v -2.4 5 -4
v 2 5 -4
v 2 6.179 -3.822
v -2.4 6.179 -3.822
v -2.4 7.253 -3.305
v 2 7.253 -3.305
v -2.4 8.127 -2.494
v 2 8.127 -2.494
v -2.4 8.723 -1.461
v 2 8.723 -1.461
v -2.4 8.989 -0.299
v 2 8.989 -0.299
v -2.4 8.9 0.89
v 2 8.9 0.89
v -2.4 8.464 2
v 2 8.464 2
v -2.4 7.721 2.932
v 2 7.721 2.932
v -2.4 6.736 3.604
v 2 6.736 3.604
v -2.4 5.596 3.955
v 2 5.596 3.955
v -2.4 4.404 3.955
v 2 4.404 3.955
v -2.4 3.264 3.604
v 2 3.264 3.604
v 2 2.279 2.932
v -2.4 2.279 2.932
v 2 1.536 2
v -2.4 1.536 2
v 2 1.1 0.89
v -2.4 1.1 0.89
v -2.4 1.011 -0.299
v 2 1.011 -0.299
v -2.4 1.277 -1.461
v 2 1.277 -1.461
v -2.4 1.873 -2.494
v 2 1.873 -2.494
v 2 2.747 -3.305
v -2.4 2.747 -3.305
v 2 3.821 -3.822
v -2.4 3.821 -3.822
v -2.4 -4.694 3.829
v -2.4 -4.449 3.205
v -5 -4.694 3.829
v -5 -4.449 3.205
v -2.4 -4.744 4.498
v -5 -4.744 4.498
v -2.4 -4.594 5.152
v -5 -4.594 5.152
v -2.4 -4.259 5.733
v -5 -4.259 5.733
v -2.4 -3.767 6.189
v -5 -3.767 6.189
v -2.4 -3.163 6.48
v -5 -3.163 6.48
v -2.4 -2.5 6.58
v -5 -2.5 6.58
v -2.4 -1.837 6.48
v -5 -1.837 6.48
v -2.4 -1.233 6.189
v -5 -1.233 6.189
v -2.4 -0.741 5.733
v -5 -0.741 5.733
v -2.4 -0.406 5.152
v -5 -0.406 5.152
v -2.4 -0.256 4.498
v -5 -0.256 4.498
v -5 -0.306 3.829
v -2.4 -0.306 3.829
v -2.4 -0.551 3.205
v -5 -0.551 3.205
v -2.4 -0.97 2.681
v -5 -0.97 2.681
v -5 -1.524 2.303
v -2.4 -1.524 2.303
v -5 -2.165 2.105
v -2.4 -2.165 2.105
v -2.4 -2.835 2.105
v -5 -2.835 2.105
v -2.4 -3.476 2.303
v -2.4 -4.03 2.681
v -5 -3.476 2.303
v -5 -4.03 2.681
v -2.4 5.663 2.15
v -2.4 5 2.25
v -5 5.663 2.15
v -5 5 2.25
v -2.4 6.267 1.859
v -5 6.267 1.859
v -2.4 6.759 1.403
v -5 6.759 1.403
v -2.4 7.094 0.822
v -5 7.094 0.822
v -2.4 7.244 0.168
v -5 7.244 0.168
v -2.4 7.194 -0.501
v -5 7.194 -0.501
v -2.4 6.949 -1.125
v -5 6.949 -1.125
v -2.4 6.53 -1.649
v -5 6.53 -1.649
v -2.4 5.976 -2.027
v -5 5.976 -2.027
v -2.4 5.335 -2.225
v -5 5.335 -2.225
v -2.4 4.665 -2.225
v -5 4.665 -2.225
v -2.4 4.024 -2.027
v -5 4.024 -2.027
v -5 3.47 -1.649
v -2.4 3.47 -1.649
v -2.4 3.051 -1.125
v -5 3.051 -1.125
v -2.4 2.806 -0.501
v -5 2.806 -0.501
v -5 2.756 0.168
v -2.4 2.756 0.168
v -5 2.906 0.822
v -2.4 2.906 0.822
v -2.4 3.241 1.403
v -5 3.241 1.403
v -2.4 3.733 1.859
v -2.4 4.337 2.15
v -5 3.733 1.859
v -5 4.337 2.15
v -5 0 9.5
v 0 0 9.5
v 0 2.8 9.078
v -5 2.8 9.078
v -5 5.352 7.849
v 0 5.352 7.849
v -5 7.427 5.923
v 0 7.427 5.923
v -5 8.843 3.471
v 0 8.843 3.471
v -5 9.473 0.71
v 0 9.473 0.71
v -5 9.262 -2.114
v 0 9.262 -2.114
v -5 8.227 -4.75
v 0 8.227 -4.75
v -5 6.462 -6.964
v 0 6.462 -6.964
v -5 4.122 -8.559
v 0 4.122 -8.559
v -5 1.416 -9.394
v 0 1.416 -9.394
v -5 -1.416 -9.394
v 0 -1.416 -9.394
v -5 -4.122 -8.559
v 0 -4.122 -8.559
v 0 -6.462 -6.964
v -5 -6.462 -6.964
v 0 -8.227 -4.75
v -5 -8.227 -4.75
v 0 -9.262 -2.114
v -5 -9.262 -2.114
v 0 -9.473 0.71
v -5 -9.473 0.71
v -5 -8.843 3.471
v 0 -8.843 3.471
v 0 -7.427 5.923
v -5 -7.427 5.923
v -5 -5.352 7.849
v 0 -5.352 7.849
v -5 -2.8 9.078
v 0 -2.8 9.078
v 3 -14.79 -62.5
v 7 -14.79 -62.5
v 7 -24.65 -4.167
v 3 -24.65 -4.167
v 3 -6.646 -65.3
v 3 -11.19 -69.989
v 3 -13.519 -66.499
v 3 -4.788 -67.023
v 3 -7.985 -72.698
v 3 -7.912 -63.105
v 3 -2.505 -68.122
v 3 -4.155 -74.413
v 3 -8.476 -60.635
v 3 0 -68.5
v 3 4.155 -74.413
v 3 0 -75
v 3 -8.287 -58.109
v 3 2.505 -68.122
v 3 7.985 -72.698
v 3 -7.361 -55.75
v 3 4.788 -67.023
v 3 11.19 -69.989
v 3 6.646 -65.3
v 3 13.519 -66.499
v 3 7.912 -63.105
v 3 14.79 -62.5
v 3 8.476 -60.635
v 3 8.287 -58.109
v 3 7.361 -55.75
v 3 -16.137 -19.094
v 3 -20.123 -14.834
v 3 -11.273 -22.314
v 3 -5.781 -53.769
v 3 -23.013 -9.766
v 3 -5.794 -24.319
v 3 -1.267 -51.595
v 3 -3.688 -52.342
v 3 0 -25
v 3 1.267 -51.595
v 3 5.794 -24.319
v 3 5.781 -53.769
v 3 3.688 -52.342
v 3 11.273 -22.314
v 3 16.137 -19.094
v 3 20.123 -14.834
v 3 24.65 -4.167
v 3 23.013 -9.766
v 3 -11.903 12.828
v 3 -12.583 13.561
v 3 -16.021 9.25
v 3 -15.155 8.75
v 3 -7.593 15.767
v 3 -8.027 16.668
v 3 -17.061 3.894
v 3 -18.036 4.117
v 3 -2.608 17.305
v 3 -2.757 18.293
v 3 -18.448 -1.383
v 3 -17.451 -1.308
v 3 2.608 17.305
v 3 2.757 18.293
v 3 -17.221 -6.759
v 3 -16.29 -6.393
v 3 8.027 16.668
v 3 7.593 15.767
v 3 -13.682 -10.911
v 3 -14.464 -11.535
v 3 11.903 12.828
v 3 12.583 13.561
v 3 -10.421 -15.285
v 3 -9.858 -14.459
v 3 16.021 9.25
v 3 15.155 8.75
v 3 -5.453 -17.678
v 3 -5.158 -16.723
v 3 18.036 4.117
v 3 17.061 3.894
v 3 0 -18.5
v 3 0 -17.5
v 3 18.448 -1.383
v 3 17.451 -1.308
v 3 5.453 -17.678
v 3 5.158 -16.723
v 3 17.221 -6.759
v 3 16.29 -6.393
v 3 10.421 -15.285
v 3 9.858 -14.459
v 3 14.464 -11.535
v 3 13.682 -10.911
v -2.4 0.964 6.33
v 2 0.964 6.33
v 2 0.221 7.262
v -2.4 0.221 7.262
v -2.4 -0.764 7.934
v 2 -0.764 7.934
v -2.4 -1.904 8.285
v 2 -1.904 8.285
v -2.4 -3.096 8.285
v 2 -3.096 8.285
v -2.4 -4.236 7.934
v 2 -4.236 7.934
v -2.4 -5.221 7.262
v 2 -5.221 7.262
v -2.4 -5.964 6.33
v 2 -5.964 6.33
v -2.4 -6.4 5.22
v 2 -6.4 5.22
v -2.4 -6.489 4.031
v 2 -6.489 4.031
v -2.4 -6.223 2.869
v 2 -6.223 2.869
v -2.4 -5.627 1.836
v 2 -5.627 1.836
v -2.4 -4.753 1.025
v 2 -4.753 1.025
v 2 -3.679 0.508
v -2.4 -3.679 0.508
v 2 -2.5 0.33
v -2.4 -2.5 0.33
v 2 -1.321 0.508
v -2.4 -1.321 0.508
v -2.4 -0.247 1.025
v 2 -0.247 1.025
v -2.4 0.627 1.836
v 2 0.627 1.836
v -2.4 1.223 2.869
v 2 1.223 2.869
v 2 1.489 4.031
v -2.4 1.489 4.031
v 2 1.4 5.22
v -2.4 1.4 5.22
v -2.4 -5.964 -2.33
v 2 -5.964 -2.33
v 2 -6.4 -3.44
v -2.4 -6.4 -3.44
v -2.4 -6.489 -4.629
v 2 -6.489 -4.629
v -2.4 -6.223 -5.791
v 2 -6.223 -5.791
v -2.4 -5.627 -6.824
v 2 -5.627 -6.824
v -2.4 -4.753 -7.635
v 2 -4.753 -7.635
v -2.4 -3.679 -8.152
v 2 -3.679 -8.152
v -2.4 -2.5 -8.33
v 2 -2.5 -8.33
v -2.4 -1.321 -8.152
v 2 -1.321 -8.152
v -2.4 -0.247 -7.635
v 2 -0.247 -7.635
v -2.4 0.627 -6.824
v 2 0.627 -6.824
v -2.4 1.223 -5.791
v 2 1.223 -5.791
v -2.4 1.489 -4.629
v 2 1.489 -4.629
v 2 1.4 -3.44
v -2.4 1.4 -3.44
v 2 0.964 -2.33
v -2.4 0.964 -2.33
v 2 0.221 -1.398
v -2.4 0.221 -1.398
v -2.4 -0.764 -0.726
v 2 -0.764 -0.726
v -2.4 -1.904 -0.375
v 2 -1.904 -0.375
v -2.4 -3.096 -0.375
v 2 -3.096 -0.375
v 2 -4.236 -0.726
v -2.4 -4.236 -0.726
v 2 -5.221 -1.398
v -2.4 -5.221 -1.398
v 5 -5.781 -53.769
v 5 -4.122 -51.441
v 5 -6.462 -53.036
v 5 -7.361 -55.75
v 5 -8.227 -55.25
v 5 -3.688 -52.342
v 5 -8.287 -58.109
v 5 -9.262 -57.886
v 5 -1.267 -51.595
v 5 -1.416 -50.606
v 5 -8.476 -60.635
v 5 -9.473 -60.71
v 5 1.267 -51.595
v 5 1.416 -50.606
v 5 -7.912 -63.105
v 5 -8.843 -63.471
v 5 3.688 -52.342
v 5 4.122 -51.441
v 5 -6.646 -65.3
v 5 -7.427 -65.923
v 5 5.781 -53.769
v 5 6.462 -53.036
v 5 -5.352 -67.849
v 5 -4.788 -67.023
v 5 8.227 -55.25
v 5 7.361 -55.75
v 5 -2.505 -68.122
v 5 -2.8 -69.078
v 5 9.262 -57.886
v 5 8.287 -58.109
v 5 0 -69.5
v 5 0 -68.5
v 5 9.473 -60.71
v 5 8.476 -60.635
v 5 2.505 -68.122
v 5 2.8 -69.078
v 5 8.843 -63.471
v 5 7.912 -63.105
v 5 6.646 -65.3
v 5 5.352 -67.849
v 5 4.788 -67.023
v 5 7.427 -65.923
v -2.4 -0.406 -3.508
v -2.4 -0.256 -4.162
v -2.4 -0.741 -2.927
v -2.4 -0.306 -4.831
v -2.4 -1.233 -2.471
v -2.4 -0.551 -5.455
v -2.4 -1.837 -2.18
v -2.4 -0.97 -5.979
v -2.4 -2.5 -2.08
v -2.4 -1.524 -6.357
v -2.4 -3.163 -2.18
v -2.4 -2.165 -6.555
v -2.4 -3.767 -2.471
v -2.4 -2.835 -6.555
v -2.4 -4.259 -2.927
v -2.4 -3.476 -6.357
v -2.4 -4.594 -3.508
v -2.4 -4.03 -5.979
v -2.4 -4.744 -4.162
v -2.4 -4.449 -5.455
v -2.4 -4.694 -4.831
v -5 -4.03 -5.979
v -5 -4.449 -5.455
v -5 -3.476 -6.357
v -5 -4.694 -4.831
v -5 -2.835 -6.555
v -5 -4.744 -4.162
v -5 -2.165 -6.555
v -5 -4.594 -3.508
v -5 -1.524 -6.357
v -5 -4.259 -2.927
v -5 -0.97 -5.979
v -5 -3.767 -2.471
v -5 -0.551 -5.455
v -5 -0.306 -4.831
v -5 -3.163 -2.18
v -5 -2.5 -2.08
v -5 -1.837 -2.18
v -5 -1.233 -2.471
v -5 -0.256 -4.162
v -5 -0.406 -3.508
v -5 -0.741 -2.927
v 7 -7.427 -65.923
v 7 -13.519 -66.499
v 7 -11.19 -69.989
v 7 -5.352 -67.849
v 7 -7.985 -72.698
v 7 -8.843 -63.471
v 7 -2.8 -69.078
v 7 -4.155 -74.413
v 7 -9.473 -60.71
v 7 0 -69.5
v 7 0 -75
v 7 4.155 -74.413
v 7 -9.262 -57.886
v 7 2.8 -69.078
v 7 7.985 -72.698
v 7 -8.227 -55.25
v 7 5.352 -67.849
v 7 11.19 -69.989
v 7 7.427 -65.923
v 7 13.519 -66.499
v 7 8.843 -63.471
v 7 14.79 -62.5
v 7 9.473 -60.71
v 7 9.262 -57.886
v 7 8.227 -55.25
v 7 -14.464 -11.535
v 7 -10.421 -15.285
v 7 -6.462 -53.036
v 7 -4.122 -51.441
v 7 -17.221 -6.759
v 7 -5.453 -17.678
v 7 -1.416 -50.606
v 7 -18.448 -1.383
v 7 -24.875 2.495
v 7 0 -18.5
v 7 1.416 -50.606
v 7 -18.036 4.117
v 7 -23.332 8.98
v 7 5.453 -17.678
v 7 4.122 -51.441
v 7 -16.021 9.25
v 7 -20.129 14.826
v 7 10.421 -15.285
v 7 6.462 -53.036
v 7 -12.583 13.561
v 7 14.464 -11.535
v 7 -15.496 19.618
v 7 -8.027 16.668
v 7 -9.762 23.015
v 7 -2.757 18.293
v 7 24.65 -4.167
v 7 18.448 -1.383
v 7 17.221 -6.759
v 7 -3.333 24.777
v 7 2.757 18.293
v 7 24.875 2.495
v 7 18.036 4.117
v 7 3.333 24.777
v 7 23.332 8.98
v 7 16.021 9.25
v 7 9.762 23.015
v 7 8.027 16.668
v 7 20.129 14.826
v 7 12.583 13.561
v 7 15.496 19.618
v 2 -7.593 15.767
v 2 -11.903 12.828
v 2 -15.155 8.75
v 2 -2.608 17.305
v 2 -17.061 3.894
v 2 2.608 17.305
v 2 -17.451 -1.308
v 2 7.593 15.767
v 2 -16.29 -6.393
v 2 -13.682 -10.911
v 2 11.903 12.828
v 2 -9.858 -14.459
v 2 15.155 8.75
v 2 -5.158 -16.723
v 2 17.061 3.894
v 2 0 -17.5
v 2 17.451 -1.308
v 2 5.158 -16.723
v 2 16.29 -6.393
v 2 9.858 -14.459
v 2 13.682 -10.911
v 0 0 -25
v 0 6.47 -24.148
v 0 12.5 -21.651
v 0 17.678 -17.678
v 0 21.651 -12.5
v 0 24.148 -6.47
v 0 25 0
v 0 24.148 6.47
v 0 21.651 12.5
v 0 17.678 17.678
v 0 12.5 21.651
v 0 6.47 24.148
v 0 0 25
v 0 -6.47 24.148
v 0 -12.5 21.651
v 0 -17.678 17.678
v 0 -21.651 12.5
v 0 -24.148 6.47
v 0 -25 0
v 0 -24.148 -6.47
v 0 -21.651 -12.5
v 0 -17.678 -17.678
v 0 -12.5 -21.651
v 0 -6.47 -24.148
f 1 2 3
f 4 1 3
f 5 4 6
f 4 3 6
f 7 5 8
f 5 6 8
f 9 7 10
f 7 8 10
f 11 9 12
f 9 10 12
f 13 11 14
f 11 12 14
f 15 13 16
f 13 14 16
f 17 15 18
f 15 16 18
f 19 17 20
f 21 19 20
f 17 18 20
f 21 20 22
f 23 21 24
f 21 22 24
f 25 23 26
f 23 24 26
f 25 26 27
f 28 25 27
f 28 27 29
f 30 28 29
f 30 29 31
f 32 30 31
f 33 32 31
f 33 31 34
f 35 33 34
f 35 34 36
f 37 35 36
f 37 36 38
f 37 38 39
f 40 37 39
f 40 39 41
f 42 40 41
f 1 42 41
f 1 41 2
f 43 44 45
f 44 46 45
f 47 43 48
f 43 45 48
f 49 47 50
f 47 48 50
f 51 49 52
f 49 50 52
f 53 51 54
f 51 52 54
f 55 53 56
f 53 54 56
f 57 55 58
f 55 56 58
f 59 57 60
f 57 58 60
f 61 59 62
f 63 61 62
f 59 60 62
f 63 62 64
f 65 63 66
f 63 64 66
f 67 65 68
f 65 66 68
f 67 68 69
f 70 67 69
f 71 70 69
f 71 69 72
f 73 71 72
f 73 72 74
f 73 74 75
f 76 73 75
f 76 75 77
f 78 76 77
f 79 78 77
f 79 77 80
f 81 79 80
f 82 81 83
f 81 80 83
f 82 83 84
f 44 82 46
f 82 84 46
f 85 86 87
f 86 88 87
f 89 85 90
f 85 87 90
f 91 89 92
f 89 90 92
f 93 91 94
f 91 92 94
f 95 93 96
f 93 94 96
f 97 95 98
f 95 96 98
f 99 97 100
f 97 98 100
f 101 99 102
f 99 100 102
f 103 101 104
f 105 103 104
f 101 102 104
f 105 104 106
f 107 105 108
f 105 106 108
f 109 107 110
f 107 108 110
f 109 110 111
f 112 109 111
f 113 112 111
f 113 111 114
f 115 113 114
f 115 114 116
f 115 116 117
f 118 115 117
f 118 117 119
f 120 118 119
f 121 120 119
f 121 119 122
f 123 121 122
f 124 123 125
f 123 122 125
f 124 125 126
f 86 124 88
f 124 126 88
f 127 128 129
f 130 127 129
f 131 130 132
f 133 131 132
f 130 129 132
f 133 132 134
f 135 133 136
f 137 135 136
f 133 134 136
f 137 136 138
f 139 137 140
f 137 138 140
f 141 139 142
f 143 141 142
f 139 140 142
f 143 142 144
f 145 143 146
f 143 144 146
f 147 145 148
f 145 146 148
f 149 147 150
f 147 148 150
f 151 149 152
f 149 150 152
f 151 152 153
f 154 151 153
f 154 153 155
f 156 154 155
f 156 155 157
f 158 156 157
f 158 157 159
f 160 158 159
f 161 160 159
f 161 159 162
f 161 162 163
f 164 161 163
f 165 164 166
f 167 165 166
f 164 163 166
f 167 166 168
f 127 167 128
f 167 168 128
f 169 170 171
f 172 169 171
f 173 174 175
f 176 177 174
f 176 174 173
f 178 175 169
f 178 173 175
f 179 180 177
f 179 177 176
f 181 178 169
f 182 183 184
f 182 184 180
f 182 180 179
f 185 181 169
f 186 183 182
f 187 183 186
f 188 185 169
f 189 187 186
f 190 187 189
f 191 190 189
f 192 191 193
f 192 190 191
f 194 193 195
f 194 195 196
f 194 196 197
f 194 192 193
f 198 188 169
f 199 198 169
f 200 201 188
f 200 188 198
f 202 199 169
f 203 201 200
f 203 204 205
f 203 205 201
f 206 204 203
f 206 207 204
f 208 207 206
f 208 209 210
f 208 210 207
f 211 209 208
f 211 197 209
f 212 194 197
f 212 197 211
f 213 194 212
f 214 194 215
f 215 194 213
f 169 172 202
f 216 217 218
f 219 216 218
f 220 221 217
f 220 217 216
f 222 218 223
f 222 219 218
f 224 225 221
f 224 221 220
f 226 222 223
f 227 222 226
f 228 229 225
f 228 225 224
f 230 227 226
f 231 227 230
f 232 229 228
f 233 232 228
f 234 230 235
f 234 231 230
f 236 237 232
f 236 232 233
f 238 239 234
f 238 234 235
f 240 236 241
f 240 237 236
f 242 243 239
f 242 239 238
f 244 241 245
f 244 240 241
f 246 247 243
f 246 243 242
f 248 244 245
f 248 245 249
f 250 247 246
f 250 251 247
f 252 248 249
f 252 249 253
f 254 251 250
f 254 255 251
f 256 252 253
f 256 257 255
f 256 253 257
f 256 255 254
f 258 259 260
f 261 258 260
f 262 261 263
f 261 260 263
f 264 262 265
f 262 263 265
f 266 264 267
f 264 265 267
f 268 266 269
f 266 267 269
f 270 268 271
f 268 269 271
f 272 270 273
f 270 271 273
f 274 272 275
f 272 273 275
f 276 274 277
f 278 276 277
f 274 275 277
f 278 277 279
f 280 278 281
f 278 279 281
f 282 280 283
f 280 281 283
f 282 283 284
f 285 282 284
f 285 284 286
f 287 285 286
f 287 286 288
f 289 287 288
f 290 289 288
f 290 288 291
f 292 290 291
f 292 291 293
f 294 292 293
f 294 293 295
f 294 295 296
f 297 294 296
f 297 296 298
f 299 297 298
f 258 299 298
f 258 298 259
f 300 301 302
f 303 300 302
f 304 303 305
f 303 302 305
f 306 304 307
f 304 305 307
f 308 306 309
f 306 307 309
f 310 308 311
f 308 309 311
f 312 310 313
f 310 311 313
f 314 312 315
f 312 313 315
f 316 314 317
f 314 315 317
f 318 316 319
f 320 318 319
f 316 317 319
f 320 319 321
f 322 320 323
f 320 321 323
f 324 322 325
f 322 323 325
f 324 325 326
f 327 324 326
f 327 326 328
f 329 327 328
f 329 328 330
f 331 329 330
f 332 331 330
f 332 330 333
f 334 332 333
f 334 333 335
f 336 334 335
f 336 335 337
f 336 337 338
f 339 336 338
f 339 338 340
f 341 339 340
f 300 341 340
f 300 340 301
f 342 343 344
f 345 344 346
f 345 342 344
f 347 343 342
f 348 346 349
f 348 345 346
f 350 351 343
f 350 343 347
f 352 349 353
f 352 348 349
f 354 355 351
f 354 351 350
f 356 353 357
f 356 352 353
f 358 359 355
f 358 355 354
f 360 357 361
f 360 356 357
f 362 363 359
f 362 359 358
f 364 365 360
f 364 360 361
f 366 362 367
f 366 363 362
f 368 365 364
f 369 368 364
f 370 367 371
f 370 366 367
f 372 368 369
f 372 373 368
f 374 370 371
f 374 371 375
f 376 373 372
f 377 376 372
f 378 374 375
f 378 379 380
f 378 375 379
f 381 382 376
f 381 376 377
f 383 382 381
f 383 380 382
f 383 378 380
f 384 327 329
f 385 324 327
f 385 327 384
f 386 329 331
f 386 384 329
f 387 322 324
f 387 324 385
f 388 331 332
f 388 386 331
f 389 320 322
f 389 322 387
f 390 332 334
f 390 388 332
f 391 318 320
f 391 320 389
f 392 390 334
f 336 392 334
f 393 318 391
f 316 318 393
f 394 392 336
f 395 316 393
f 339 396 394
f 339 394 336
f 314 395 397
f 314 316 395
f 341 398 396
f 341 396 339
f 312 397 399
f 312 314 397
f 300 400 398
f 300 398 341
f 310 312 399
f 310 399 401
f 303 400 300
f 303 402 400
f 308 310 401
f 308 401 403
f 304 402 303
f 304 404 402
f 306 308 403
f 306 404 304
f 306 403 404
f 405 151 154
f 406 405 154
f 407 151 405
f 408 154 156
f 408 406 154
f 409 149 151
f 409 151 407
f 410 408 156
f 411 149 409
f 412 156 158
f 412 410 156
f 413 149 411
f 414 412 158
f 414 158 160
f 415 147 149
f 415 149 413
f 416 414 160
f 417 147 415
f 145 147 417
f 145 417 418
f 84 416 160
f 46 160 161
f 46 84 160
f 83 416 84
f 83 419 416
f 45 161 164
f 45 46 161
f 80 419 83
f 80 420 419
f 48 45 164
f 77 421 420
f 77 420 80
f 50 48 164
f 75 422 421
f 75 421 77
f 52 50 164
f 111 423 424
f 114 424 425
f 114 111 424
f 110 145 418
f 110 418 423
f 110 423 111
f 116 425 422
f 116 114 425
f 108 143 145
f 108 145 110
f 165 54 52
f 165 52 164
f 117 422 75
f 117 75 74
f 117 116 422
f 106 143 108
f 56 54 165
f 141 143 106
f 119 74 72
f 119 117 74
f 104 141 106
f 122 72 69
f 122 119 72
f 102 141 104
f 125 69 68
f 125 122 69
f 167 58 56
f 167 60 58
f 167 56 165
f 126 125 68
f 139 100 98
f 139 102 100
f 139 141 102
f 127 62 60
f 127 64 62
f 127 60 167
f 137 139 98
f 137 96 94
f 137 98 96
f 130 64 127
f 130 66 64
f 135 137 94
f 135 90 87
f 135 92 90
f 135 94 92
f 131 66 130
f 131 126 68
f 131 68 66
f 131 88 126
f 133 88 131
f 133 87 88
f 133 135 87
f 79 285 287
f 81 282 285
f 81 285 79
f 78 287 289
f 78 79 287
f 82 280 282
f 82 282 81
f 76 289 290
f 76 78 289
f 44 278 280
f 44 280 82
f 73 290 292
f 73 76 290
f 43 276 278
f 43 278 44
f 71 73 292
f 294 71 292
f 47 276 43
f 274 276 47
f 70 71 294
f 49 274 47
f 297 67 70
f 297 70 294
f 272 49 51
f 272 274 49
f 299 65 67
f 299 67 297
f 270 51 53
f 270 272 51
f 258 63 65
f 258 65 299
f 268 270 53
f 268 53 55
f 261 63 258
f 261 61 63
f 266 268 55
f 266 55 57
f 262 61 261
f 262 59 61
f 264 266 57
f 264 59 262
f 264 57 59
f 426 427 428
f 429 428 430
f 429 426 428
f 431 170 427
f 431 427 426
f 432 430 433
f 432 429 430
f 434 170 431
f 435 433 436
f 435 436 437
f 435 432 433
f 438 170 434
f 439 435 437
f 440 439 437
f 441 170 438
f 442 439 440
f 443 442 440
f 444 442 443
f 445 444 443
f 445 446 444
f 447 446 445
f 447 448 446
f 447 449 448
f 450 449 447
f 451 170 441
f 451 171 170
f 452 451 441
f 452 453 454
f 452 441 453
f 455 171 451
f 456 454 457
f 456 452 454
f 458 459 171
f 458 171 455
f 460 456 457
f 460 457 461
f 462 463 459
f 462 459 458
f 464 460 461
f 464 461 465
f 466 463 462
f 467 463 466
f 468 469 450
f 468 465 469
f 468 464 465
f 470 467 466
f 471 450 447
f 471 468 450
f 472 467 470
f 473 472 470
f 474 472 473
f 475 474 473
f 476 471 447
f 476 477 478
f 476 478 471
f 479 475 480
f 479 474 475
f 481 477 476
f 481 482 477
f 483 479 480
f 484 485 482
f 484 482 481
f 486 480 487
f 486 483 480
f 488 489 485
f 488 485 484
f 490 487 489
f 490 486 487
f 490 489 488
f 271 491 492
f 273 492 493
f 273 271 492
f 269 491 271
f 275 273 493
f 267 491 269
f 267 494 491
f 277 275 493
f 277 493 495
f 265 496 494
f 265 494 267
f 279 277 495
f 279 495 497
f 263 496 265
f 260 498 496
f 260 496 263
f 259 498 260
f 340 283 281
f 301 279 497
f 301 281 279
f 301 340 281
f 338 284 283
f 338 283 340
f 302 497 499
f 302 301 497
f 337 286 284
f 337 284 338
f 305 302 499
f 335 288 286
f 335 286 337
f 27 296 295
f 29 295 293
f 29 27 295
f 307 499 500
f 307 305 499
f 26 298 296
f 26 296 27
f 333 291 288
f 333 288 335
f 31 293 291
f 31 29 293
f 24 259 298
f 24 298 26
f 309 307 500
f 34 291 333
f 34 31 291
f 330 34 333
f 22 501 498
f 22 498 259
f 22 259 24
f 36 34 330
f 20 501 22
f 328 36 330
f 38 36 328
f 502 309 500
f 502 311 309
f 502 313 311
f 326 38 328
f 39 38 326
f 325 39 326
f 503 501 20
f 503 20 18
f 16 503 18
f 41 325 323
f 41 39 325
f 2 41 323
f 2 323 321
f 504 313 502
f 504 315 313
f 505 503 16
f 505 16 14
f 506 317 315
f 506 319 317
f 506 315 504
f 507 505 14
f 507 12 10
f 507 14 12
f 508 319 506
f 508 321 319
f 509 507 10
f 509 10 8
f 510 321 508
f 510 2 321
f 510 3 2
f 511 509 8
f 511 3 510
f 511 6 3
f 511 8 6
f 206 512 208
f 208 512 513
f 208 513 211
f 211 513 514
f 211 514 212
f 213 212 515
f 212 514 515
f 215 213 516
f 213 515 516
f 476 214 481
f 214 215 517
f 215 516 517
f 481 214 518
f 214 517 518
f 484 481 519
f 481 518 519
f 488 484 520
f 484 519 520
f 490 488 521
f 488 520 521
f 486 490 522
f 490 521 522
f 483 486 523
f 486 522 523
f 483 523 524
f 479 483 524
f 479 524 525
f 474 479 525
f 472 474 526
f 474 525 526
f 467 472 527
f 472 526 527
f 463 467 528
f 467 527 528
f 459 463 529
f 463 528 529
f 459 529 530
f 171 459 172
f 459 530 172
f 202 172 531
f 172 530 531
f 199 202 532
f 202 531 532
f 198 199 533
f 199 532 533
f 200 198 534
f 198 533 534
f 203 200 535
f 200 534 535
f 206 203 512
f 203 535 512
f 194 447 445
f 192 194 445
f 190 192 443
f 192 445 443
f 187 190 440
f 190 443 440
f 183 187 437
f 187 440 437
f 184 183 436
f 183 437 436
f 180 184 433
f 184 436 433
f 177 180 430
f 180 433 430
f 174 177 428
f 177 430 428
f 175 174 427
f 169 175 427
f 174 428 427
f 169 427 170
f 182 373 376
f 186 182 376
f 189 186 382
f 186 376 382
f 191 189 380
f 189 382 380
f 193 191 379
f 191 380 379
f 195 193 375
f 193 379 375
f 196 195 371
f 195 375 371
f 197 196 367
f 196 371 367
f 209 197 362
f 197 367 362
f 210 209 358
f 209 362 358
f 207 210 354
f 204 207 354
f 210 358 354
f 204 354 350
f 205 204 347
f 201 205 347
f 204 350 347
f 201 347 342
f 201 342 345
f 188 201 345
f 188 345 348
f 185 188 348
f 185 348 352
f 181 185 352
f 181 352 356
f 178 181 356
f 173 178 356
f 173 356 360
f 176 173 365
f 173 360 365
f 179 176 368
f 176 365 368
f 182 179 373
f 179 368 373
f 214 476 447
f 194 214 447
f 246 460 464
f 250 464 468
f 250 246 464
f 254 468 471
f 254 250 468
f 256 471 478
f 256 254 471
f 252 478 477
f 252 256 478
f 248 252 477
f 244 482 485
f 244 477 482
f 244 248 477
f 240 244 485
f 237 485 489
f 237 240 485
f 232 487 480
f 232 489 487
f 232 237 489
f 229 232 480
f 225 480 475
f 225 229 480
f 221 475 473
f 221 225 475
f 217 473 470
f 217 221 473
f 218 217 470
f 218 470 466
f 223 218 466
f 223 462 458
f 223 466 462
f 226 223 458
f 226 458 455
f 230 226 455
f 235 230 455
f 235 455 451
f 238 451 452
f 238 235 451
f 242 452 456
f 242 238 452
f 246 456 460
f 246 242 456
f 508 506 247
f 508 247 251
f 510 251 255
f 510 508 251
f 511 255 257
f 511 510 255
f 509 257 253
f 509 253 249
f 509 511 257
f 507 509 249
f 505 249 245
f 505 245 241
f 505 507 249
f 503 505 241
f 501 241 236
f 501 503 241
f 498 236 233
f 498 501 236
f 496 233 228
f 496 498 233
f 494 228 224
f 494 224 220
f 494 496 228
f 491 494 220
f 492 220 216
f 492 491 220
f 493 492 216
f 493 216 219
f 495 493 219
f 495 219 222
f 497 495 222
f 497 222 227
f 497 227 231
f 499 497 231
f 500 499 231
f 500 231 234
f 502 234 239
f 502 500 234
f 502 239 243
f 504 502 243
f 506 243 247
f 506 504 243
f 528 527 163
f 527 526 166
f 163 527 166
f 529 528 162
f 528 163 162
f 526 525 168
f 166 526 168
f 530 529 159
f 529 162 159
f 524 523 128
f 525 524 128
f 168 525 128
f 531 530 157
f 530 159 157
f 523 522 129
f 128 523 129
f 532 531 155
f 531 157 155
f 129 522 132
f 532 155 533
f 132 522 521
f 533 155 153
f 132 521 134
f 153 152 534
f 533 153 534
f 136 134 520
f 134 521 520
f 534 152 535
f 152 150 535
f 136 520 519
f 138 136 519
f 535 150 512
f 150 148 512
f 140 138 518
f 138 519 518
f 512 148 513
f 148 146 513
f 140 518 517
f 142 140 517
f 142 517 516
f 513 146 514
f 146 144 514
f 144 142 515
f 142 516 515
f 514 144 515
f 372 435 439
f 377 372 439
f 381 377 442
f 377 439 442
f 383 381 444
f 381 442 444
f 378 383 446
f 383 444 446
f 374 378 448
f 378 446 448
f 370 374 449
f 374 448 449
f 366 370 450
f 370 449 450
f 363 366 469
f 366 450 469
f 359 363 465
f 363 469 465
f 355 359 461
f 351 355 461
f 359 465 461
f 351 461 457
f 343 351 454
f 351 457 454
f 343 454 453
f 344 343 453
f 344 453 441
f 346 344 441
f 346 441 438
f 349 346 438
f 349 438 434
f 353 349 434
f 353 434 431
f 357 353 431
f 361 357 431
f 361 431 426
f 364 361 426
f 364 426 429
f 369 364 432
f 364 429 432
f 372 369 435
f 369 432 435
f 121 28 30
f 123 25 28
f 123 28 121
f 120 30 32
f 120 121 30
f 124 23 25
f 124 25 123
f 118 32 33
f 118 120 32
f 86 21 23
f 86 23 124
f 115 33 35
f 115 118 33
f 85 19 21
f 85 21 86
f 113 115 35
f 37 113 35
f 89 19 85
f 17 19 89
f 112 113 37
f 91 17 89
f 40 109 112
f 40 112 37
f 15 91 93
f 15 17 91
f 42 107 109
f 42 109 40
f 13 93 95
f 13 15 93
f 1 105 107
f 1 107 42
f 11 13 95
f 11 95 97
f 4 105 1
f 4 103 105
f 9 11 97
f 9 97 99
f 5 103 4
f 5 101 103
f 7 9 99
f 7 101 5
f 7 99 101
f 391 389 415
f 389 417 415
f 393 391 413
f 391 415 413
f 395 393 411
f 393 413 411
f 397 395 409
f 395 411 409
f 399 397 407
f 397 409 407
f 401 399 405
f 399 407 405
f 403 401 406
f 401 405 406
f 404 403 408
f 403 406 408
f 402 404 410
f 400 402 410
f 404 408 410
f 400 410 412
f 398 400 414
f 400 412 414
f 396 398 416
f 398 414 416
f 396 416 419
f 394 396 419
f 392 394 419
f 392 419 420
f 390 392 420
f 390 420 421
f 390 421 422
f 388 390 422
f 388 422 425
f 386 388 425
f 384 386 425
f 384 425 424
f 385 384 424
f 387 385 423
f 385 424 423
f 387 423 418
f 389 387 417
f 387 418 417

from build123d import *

# Parameters (mm, degrees)
SKETCH_3_R                   = 25
EXTRUDE_1_DEPTH              = 2
SKETCH_4_R                   = 25
SKETCH_4_R_2                 = 17.5
EXTRUDE_2_DEPTH              = 1
SKETCH_5_R                   = 25
SKETCH_5_R_2                 = 18.5
EXTRUDE_3_DEPTH              = 7
SKETCH_6_R                   = 25
SKETCH_6_R_2                 = 17.5
EXTRUDE_4_DEPTH              = 2
EXTRUDE_5_DEPTH              = 9
SKETCH_11_R                  = 8.5
CUT_EXTRUDE_3_DEPTH          = 111
SKETCH_12_R                  = 9.5
CUT_EXTRUDE_4_DEPTH          = 2.5
SKETCH_13_R                  = 9.5
EXTRUDE_6_DEPTH              = 5
HOLE_WIZARD_M4_1_D           = 4.5
HOLE_WIZARD_M4_1_CBORE_D     = 8
HOLE_WIZARD_M4_1_CBORE_DEPTH = 4.4
PATTERN_CIRCULAR_1_COUNT     = 3
SKETCH_17_W                  = 17.714059585
SKETCH_17_H                  = 64.604217311
CUT_EXTRUDE_5_DEPTH          = 1111


with BuildPart() as part:
    # 스케치3 → 보스-돌출1 (new body)
    with BuildSketch(Plane(origin=(0, 0, 0), x_dir=(0, 0, -1), z_dir=(1, 0, 0))):
        Circle(SKETCH_3_R)
    extrude(amount=EXTRUDE_1_DEPTH)

    # 스케치4 → 보스-돌출2 (add)
    with BuildSketch(Plane(origin=(2, 0, 0), x_dir=(0, 0, -1), z_dir=(1, 0, 0))):
        Circle(SKETCH_4_R)
        Circle(SKETCH_4_R_2, mode=Mode.SUBTRACT)
    extrude(amount=EXTRUDE_2_DEPTH)

    # 스케치5 → 보스-돌출3 (add)
    with BuildSketch(Plane(origin=(3, 0, 0), x_dir=(0, 0, -1), z_dir=(1, 0, 0))):
        Circle(SKETCH_5_R)
        Circle(SKETCH_5_R_2, mode=Mode.SUBTRACT)
    extrude(amount=EXTRUDE_3_DEPTH)

    # 스케치6 → 보스-돌출4 (add)
    with BuildSketch(Plane(origin=(10, 0, 0), x_dir=(0, 0, -1), z_dir=(1, 0, 0))):
        Circle(SKETCH_6_R)
        Circle(SKETCH_6_R_2, mode=Mode.SUBTRACT)
    extrude(amount=EXTRUDE_4_DEPTH)

    # 스케치10 → 보스-돌출5 (add)
    with BuildSketch(Plane(origin=(12, 0, 0), x_dir=(0, 0, -1), z_dir=(1, 0, 0))):
        with BuildLine():
            Line((4.166666667, 24.65033243), (62.5, 14.790199458))
            ThreePointArc((62.5, 14.790199458), (75, 0), (62.5, -14.790199458))
            Line((62.5, -14.790199458), (4.166666667, -24.65033243))
            ThreePointArc((4.166666667, -24.65033243), (25, 0), (4.166666667, 24.65033243))
        make_face()
    extrude(amount=-EXTRUDE_5_DEPTH)

    # 스케치11 → 컷-돌출3 (cut, symmetric)
    with BuildSketch(Plane(origin=(7.5, 0, 0), x_dir=(0, 0, -1), z_dir=(1, 0, 0))):
        with Locations((60, 0)):
            Circle(SKETCH_11_R)
    extrude(amount=CUT_EXTRUDE_3_DEPTH, both=True, mode=Mode.SUBTRACT)

    # 스케치12 → 컷-돌출4 (cut, symmetric)
    with BuildSketch(Plane(origin=(7.5, 0, 0), x_dir=(0, 0, -1), z_dir=(1, 0, 0))):
        with Locations((60, 0)):
            Circle(SKETCH_12_R)
    extrude(amount=CUT_EXTRUDE_4_DEPTH, both=True, mode=Mode.SUBTRACT)

    # 스케치13 → 보스-돌출6 (add)
    with BuildSketch(Plane.ZY):
        Circle(SKETCH_13_R)
    extrude(amount=EXTRUDE_6_DEPTH)

    # M4 육각 소켓 머리 캡 나사용 카운터보어1 (through all)
    with Locations(Plane(origin=(2, 0, 0), x_dir=(0, 0, -1), z_dir=(1, 0, 0))):
        with Locations((0, 5)):
            hole_wizard_m4_1 = CounterBoreHole(HOLE_WIZARD_M4_1_D / 2, HOLE_WIZARD_M4_1_CBORE_D / 2, HOLE_WIZARD_M4_1_CBORE_DEPTH)

    # 원형 패턴1: M4 육각 소켓 머리 캡 나사용 카운터보어1 ×3 about axis
    pattern_circular_1_axis = Axis((0, 0, 0), (1, 0, 0))
    for i in range(1, PATTERN_CIRCULAR_1_COUNT):
        add(hole_wizard_m4_1.rotate(pattern_circular_1_axis, i * 360 / PATTERN_CIRCULAR_1_COUNT), mode=Mode.SUBTRACT)

    # 스케치17 → 컷-돌출5 (cut, symmetric)
    with BuildSketch(Plane.XY):
        with Locations((15.857029793, -1.852450676)):
            Rectangle(SKETCH_17_W, SKETCH_17_H)
    extrude(amount=CUT_EXTRUDE_5_DEPTH, both=True, mode=Mode.SUBTRACT)


solid = part.part
